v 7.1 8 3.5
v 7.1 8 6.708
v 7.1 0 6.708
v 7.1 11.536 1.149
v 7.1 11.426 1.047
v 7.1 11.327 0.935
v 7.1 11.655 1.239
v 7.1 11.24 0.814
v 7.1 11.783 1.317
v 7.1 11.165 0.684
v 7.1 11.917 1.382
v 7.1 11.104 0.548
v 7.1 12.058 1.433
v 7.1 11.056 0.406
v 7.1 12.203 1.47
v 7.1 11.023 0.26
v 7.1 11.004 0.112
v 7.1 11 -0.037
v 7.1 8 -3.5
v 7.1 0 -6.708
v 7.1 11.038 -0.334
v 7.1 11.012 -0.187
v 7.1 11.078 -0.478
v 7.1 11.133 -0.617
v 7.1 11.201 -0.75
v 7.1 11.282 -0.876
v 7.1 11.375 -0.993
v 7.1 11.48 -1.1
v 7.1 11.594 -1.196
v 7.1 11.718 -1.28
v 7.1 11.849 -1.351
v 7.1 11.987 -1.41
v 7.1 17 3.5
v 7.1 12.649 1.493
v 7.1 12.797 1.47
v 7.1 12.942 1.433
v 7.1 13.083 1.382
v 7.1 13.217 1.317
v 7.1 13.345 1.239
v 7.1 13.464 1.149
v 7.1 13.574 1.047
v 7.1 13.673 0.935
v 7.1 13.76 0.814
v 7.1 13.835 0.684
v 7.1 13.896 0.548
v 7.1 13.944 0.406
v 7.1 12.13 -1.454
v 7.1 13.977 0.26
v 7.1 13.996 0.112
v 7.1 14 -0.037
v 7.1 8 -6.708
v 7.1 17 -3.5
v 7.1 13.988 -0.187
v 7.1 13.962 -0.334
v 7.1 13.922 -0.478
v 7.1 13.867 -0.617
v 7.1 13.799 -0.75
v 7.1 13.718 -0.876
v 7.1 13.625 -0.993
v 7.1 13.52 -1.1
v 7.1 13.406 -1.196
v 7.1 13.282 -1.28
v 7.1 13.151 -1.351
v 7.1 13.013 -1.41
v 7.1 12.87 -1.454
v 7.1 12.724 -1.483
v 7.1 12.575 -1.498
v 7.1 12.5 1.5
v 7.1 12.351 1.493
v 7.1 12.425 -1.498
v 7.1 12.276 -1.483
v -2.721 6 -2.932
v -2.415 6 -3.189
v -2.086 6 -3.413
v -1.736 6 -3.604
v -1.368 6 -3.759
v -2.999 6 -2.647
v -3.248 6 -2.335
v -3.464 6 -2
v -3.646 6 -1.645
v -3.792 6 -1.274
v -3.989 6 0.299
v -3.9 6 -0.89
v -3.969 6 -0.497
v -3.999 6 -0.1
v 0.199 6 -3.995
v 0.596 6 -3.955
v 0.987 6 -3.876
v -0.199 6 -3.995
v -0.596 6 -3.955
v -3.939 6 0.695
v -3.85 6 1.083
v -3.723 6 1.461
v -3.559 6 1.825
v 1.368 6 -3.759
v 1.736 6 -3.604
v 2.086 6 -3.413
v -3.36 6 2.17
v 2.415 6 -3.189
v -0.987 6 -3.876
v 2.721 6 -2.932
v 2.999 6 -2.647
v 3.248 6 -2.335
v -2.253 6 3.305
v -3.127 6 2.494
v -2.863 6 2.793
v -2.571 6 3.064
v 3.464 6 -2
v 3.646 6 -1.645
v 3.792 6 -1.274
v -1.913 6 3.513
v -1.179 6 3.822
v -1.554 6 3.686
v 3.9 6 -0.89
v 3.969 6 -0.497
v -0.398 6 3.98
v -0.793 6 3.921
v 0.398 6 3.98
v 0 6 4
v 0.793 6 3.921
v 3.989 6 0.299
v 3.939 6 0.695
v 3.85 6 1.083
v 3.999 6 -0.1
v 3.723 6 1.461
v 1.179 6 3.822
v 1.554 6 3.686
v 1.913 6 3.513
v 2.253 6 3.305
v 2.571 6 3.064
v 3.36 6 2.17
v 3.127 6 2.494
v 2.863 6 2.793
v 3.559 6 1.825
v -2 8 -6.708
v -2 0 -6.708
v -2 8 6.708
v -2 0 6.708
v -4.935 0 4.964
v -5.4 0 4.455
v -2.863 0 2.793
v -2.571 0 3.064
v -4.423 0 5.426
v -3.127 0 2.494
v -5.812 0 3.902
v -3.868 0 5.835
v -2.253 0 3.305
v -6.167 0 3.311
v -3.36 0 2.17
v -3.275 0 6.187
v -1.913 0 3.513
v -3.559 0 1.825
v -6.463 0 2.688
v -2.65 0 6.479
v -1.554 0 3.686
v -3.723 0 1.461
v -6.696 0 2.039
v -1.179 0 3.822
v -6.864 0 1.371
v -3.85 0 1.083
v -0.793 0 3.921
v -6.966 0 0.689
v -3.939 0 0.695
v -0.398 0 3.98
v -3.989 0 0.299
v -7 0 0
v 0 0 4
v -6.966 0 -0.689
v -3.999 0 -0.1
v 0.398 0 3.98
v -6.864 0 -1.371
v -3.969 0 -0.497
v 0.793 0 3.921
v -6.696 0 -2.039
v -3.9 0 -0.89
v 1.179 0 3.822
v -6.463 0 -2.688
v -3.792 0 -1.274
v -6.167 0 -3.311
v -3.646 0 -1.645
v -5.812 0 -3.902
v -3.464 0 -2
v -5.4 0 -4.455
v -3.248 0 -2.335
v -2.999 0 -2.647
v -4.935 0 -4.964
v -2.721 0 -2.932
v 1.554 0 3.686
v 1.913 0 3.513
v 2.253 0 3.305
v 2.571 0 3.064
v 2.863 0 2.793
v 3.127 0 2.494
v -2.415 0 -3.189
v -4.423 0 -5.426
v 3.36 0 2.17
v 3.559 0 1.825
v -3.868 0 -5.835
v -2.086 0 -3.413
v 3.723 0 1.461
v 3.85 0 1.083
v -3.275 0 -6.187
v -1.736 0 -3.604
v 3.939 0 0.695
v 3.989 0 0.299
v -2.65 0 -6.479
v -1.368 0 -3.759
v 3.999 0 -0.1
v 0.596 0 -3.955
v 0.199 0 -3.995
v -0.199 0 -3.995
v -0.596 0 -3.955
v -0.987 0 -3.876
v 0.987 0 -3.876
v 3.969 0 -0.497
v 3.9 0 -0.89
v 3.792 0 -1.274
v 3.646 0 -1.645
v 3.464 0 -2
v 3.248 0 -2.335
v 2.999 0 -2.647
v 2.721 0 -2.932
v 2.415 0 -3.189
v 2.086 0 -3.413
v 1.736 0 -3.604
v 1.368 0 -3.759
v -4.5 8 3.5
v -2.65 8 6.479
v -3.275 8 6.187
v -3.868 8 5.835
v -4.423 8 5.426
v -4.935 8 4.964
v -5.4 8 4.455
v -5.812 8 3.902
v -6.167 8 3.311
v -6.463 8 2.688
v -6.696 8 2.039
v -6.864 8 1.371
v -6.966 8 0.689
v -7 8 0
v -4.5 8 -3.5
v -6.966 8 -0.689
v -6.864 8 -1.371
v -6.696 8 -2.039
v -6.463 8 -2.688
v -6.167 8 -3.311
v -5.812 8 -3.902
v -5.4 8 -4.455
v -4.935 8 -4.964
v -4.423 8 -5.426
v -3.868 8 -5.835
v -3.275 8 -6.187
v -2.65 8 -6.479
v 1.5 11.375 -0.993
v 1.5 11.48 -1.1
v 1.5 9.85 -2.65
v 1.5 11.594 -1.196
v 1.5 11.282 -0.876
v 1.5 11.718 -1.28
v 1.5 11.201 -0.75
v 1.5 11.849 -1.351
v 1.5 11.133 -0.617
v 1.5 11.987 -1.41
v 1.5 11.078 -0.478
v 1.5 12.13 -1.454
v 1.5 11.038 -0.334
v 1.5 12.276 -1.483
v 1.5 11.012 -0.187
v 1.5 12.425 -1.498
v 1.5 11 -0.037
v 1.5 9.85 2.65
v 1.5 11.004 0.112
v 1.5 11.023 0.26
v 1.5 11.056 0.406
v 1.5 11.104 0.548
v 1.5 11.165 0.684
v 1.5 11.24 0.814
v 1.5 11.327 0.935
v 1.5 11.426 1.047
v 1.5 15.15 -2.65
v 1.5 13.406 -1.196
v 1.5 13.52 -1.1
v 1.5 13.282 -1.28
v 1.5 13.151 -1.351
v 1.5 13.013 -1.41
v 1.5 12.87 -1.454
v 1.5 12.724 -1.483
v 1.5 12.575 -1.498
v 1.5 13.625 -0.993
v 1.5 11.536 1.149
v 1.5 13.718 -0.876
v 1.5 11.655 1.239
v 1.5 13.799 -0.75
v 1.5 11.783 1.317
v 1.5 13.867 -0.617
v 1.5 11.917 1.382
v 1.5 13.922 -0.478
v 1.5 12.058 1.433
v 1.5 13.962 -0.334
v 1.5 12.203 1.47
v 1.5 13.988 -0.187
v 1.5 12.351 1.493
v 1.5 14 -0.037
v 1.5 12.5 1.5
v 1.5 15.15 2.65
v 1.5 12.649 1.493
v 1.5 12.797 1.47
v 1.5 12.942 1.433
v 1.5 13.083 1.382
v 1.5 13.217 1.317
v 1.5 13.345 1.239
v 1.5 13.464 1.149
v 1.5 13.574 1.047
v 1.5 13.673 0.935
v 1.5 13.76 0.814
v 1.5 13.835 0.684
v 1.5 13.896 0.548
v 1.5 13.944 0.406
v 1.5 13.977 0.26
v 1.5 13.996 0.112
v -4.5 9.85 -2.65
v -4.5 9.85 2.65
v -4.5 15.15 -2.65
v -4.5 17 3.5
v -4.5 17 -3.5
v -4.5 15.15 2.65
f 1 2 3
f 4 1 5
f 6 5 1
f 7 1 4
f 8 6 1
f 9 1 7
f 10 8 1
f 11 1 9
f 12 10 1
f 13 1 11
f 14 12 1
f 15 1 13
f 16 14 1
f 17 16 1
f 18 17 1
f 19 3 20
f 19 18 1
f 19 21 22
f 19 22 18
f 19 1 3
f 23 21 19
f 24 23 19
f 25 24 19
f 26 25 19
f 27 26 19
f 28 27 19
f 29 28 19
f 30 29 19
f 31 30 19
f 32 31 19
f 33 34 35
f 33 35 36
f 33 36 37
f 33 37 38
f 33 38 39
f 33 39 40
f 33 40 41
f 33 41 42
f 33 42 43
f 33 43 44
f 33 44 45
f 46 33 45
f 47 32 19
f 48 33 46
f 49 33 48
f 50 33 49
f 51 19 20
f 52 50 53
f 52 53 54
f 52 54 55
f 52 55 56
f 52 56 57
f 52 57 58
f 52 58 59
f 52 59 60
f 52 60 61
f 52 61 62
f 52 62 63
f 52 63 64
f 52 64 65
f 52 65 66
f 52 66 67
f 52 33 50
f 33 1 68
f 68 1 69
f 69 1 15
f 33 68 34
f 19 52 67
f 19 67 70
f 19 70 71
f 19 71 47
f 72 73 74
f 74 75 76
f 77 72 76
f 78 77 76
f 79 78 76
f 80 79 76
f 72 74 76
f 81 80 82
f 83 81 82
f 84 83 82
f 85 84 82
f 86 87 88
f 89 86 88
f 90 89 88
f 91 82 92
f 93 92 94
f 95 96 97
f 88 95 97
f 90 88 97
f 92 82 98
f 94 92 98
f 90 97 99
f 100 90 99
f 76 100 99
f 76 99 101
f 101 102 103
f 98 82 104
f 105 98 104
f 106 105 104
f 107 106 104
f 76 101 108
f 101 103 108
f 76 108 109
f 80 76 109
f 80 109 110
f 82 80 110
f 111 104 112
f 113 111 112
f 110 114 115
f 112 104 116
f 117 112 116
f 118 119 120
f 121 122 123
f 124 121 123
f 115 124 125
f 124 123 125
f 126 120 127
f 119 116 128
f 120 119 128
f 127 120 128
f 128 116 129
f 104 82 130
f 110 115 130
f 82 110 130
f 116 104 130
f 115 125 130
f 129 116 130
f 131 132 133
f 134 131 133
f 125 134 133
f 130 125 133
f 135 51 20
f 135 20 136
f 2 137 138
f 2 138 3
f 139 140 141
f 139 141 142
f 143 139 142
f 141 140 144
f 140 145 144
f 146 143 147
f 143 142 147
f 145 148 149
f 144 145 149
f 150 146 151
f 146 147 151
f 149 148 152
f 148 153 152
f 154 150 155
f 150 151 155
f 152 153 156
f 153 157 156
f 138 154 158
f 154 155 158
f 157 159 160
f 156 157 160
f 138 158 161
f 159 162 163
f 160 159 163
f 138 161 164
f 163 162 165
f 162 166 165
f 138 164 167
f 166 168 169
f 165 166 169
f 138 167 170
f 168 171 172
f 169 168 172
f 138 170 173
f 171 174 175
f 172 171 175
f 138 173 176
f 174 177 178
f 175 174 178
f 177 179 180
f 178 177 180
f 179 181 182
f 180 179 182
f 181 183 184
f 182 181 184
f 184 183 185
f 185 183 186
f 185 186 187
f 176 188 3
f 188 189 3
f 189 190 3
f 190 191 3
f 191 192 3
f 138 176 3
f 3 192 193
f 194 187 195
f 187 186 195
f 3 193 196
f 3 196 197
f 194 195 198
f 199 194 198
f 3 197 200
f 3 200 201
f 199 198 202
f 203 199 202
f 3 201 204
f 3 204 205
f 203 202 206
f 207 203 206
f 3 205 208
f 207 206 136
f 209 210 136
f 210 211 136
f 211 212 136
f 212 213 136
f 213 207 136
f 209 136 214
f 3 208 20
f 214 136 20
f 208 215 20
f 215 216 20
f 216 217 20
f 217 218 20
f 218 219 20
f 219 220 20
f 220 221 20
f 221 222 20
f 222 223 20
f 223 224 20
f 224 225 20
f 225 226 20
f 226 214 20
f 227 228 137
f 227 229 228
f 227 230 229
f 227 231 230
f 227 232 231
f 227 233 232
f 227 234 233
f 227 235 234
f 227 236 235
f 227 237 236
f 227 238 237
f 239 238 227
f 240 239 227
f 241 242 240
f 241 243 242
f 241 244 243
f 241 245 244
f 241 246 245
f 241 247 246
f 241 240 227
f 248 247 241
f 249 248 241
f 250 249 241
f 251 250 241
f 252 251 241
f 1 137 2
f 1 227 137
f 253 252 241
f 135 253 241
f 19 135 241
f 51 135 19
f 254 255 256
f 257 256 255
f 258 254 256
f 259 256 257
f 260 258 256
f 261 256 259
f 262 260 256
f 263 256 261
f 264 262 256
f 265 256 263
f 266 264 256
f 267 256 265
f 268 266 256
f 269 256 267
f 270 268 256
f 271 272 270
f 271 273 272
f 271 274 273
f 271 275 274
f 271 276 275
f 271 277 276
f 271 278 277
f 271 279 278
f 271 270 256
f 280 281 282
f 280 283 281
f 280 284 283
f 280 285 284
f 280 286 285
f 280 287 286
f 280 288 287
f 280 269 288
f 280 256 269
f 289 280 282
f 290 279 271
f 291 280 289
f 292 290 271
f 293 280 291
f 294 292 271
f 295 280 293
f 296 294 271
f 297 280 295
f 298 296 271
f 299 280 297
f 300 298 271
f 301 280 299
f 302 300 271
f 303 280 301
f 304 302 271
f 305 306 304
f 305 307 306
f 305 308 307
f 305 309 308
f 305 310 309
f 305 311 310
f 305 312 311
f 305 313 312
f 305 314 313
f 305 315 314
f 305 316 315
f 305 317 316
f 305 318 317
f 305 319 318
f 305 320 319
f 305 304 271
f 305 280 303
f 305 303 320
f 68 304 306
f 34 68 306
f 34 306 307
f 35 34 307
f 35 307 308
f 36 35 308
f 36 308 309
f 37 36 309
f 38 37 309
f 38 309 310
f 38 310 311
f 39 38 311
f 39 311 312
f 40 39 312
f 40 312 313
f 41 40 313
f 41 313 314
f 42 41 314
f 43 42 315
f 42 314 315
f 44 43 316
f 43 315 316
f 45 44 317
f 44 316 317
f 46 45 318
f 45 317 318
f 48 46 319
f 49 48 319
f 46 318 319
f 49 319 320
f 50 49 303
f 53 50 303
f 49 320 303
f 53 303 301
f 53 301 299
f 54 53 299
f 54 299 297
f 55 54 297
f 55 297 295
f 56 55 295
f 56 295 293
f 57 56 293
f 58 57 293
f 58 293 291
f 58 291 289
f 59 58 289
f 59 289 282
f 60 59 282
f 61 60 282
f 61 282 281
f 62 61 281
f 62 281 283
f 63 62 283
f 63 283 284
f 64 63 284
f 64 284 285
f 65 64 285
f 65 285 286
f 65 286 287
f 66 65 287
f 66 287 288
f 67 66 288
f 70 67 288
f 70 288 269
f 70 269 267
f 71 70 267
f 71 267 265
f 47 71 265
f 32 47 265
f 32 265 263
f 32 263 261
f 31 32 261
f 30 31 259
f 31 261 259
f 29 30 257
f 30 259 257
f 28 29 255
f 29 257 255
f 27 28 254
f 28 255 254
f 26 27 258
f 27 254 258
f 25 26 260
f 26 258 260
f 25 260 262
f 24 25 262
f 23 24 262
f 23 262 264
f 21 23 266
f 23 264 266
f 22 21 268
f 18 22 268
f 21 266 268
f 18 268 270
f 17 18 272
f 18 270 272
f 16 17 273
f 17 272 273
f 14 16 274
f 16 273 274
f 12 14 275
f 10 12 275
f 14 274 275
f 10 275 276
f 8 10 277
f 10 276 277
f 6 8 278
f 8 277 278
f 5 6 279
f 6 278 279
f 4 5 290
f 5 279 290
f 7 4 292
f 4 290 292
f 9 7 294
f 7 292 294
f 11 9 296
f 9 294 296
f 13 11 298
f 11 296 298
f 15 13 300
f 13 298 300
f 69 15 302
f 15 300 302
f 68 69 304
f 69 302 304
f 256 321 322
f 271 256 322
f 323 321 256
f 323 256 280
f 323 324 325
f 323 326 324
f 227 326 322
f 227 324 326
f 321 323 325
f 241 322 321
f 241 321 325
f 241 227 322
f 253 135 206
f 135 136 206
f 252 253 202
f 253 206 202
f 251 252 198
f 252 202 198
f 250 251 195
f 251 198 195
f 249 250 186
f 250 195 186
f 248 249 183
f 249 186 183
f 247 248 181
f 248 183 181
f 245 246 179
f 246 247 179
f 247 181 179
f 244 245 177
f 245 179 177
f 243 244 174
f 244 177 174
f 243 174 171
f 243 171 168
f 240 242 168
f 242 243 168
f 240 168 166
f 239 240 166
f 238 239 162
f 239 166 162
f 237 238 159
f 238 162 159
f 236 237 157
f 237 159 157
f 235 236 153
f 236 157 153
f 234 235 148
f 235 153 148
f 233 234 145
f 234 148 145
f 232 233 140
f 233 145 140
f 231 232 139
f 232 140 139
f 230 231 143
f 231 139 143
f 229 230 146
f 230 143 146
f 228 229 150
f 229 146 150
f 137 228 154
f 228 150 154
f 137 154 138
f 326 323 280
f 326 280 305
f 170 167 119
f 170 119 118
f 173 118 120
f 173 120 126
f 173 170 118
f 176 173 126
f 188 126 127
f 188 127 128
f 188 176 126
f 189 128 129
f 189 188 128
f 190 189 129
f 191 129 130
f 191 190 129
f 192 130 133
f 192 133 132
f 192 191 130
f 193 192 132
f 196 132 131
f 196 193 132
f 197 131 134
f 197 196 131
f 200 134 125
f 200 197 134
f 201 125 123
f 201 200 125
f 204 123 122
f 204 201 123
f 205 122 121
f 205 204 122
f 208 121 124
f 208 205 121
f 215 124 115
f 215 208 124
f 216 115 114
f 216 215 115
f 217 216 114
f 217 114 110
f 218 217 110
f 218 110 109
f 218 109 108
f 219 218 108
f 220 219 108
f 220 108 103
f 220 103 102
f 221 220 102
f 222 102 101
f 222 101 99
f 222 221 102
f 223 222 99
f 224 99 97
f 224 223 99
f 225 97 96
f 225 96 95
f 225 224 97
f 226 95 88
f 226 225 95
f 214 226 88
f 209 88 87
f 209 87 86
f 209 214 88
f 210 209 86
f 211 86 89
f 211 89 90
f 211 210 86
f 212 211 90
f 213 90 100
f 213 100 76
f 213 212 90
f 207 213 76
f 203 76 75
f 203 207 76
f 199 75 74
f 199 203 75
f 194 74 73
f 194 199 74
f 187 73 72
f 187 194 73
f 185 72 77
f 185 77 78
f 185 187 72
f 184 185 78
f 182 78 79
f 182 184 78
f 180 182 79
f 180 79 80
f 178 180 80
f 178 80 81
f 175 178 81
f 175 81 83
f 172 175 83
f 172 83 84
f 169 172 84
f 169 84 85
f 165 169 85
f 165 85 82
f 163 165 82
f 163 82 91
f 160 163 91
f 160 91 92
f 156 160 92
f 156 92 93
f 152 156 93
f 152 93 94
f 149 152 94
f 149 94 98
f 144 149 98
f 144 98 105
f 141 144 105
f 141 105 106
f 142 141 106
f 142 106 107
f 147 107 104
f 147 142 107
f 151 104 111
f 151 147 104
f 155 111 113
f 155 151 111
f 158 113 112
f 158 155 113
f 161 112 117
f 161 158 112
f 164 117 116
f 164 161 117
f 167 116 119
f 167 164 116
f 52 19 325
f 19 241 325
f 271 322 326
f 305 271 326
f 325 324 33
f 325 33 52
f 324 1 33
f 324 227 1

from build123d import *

# Parameters (mm, degrees)
SKETCH1_R           = 7
SKETCH1_R_2         = 4
BOSS_EXTRUDE1_DEPTH = 6
SKETCH2_R           = 7
BOSS_EXTRUDE2_DEPTH = 10
CUT_EXTRUDE1_DEPTH  = 8
SKETCH4_W           = 4.3
SKETCH4_H           = 6.3
CUT_EXTRUDE2_DEPTH  = 6
SKETCH5_OUTSIDE_W   = 21.092
SKETCH5_OUTSIDE_H   = 21.092
CUT_EXTRUDE3_DEPTH  = 8
BOSS_EXTRUDE3_DEPTH = 8
SKETCH9_R           = 7
CUT_EXTRUDE6_DEPTH  = 8
SKETCH10_W          = 9
SKETCH10_H          = 7
BOSS_EXTRUDE5_DEPTH = 9
SKETCH11_W          = 5.3
SKETCH11_H          = 5.3
CUT_EXTRUDE7_DEPTH  = 6
BOSS_EXTRUDE6_DEPTH = 8
SKETCH14_W          = 7
SKETCH14_H          = 9
BOSS_EXTRUDE7_DEPTH = 2.6
SKETCH15_W          = 4
SKETCH15_H          = 5
CUT_EXTRUDE10_DEPTH = 9
SKETCH16_R          = 1.5
CUT_EXTRUDE11_DEPTH = 6.6


with BuildPart() as part:
    # Sketch1 → Boss-Extrude1 (new body)
    with BuildSketch(Plane(origin=(0, 0, 0), x_dir=(1, 0, 0), z_dir=(0, 1, 0))):
        with Locations(Location((0, 0, 0), (0, 0, 270))):  # turned: the seam where the file's is
            Circle(SKETCH1_R)
        with Locations(Location((0, 0, 0), (0, 0, 270))):  # turned: the seam where the file's is
            Circle(SKETCH1_R_2, mode=Mode.SUBTRACT)
    extrude(amount=BOSS_EXTRUDE1_DEPTH)

    # Sketch2 → Boss-Extrude2 (add)
    with BuildSketch(Plane(origin=(0, 6, 0), x_dir=(1, 0, 0), z_dir=(0, 1, 0))):
        with Locations(Location((0, 0, 0), (0, 0, 270))):  # turned: the seam where the file's is
            Circle(SKETCH2_R)
    extrude(amount=BOSS_EXTRUDE2_DEPTH)

    # Sketch3 → Cut-Extrude1 (cut)
    with BuildSketch(Plane(origin=(0, 16, 0), x_dir=(1, 0, 0), z_dir=(0, 1, 0))):
        with BuildLine():
            Line((0, 7), (0, -7))
            ThreePointArc((0, -7), (-7, 0), (0, 7))
        make_face()
    extrude(amount=-CUT_EXTRUDE1_DEPTH, mode=Mode.SUBTRACT)

    # Sketch4 → Cut-Extrude2 (cut)
    with BuildSketch(Plane.ZY):
        with Locations((0, 12.15)):
            Rectangle(SKETCH4_W, SKETCH4_H)
    extrude(amount=-CUT_EXTRUDE2_DEPTH, mode=Mode.SUBTRACT)

    # Sketch5 outside → Cut-Extrude3 (cut)
    with BuildSketch(Plane(origin=(0, 16, 0), x_dir=(1, 0, 0), z_dir=(0, 1, 0))):
        Rectangle(SKETCH5_OUTSIDE_W, SKETCH5_OUTSIDE_H)
        with BuildLine():
            Line((0, 4), (5.744562647, 4))
            ThreePointArc((5.744562647, 4), (7, 0), (5.744562647, -4))
            Line((5.744562647, -4), (0, -4))
            Line((0, -4), (0, 4))
        make_face(mode=Mode.SUBTRACT)
    extrude(amount=-CUT_EXTRUDE3_DEPTH, mode=Mode.SUBTRACT)

    # Sketch7 → Boss-Extrude3 (add)
    with BuildSketch(Plane(origin=(0, 8, 0), x_dir=(1, 0, 0), z_dir=(0, 1, 0))):
        with BuildLine():
            Line((2, 6.708203932), (2, 11.708203932))
            Line((2, 11.708203932), (-2, 11.708203932))
            Line((-2, 11.708203932), (-2, 6.708203932))
            ThreePointArc((-2, 6.708203932), (0, 7), (2, 6.708203932))
        make_face()
        with BuildLine():
            Line((2, -6.708203932), (2, -11.708203932))
            Line((2, -11.708203932), (-2, -11.708203932))
            Line((-2, -11.708203932), (-2, -6.708203932))
            ThreePointArc((-2, -6.708203932), (0, -7), (2, -6.708203932))
        make_face()
    extrude(amount=-BOSS_EXTRUDE3_DEPTH)

    # Sketch9 → Cut-Extrude6 (cut)
    with BuildSketch(Plane(origin=(0, 16, 0), x_dir=(1, 0, 0), z_dir=(0, 1, 0))):
        Circle(SKETCH9_R)
    extrude(amount=-CUT_EXTRUDE6_DEPTH, mode=Mode.SUBTRACT)

    # Sketch10 → Boss-Extrude5 (add)
    with BuildSketch(Plane(origin=(0, 8, 0), x_dir=(1, 0, 0), z_dir=(0, 1, 0))):
        Rectangle(SKETCH10_W, SKETCH10_H)
    extrude(amount=BOSS_EXTRUDE5_DEPTH)

    # Sketch11 → Cut-Extrude7 (cut)
    with BuildSketch(Plane.ZY.offset(4.5)):
        with Locations((0, 12.5)):
            Rectangle(SKETCH11_W, SKETCH11_H)
    extrude(amount=-CUT_EXTRUDE7_DEPTH, mode=Mode.SUBTRACT)

    # Sketch13 → Boss-Extrude6 (add)
    with BuildSketch(Plane(origin=(0, 8, 0), x_dir=(1, 0, 0), z_dir=(0, 1, 0))):
        with BuildLine():
            Line((2, -6.708203932), (7.1, -6.708203932))
            Line((7.1, -6.708203932), (7.1, 6.708203932))
            Line((7.1, 6.708203932), (2, 6.708203932))
            ThreePointArc((2, 6.708203932), (7, 0), (2, -6.708203932))
        make_face()
    extrude(amount=-BOSS_EXTRUDE6_DEPTH)

    # Sketch14 → Boss-Extrude7 (add)
    with BuildSketch(Plane(origin=(4.5, 0, 0), x_dir=(0, 0, -1), z_dir=(1, 0, 0))):
        with Locations((0, 12.5)):
            Rectangle(SKETCH14_W, SKETCH14_H)
    extrude(amount=BOSS_EXTRUDE7_DEPTH)

    # Sketch15 → Cut-Extrude10 (cut, through all)
    with BuildSketch(Plane(origin=(0, 8, 0), x_dir=(1, 0, 0), z_dir=(0, 1, 0))):
        with Locations((0, 9.208203932)):
            Rectangle(SKETCH15_W, SKETCH15_H)
        with Locations((0, -9.208203932)):
            Rectangle(SKETCH15_W, SKETCH15_H)
    extrude(amount=-CUT_EXTRUDE10_DEPTH, mode=Mode.SUBTRACT)

    # Sketch16 → Cut-Extrude11 (cut, through all)
    with BuildSketch(Plane.ZY.offset(-1.5)):
        with Locations((0, 12.5)):
            Circle(SKETCH16_R)
    extrude(amount=-CUT_EXTRUDE11_DEPTH, mode=Mode.SUBTRACT)


solid = part.part
